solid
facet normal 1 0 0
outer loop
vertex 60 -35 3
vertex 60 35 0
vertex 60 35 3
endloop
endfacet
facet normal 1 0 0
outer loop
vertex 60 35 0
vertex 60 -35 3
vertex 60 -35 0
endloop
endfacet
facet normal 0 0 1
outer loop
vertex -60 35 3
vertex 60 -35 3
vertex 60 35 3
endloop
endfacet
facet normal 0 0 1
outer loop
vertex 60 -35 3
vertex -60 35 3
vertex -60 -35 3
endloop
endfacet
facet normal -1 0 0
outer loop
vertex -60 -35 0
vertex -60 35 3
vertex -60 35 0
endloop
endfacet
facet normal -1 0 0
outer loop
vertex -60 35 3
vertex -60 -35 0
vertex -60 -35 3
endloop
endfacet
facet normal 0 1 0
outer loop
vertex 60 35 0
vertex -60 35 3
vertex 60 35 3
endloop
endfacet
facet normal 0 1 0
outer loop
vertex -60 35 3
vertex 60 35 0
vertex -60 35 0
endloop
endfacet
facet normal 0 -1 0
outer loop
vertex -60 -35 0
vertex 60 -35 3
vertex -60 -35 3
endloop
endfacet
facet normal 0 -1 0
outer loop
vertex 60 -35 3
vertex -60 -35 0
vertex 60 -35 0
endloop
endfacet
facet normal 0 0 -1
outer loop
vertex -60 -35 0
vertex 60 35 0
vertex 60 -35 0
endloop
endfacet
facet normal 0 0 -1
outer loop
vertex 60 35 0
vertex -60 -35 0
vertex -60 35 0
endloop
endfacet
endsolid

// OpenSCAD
// Built by bench/smallmodels/features/compiler.py from a list of features.
$fn = 64;
difference() {
  union() {
    translate([0, 0, 0]) translate([-60, -35, 0]) cube([120, 70, 40]);
  }
  union() {
    translate([0, 0, 3]) rotate([0, 0, 0]) translate([-60, -35, 0]) cube([120, 70, 37]);
    translate([-6, -3, 13]) rotate([0, 0, 0]) translate([-57, -32, 0]) cube([114, 64, 10]);
  }
}
